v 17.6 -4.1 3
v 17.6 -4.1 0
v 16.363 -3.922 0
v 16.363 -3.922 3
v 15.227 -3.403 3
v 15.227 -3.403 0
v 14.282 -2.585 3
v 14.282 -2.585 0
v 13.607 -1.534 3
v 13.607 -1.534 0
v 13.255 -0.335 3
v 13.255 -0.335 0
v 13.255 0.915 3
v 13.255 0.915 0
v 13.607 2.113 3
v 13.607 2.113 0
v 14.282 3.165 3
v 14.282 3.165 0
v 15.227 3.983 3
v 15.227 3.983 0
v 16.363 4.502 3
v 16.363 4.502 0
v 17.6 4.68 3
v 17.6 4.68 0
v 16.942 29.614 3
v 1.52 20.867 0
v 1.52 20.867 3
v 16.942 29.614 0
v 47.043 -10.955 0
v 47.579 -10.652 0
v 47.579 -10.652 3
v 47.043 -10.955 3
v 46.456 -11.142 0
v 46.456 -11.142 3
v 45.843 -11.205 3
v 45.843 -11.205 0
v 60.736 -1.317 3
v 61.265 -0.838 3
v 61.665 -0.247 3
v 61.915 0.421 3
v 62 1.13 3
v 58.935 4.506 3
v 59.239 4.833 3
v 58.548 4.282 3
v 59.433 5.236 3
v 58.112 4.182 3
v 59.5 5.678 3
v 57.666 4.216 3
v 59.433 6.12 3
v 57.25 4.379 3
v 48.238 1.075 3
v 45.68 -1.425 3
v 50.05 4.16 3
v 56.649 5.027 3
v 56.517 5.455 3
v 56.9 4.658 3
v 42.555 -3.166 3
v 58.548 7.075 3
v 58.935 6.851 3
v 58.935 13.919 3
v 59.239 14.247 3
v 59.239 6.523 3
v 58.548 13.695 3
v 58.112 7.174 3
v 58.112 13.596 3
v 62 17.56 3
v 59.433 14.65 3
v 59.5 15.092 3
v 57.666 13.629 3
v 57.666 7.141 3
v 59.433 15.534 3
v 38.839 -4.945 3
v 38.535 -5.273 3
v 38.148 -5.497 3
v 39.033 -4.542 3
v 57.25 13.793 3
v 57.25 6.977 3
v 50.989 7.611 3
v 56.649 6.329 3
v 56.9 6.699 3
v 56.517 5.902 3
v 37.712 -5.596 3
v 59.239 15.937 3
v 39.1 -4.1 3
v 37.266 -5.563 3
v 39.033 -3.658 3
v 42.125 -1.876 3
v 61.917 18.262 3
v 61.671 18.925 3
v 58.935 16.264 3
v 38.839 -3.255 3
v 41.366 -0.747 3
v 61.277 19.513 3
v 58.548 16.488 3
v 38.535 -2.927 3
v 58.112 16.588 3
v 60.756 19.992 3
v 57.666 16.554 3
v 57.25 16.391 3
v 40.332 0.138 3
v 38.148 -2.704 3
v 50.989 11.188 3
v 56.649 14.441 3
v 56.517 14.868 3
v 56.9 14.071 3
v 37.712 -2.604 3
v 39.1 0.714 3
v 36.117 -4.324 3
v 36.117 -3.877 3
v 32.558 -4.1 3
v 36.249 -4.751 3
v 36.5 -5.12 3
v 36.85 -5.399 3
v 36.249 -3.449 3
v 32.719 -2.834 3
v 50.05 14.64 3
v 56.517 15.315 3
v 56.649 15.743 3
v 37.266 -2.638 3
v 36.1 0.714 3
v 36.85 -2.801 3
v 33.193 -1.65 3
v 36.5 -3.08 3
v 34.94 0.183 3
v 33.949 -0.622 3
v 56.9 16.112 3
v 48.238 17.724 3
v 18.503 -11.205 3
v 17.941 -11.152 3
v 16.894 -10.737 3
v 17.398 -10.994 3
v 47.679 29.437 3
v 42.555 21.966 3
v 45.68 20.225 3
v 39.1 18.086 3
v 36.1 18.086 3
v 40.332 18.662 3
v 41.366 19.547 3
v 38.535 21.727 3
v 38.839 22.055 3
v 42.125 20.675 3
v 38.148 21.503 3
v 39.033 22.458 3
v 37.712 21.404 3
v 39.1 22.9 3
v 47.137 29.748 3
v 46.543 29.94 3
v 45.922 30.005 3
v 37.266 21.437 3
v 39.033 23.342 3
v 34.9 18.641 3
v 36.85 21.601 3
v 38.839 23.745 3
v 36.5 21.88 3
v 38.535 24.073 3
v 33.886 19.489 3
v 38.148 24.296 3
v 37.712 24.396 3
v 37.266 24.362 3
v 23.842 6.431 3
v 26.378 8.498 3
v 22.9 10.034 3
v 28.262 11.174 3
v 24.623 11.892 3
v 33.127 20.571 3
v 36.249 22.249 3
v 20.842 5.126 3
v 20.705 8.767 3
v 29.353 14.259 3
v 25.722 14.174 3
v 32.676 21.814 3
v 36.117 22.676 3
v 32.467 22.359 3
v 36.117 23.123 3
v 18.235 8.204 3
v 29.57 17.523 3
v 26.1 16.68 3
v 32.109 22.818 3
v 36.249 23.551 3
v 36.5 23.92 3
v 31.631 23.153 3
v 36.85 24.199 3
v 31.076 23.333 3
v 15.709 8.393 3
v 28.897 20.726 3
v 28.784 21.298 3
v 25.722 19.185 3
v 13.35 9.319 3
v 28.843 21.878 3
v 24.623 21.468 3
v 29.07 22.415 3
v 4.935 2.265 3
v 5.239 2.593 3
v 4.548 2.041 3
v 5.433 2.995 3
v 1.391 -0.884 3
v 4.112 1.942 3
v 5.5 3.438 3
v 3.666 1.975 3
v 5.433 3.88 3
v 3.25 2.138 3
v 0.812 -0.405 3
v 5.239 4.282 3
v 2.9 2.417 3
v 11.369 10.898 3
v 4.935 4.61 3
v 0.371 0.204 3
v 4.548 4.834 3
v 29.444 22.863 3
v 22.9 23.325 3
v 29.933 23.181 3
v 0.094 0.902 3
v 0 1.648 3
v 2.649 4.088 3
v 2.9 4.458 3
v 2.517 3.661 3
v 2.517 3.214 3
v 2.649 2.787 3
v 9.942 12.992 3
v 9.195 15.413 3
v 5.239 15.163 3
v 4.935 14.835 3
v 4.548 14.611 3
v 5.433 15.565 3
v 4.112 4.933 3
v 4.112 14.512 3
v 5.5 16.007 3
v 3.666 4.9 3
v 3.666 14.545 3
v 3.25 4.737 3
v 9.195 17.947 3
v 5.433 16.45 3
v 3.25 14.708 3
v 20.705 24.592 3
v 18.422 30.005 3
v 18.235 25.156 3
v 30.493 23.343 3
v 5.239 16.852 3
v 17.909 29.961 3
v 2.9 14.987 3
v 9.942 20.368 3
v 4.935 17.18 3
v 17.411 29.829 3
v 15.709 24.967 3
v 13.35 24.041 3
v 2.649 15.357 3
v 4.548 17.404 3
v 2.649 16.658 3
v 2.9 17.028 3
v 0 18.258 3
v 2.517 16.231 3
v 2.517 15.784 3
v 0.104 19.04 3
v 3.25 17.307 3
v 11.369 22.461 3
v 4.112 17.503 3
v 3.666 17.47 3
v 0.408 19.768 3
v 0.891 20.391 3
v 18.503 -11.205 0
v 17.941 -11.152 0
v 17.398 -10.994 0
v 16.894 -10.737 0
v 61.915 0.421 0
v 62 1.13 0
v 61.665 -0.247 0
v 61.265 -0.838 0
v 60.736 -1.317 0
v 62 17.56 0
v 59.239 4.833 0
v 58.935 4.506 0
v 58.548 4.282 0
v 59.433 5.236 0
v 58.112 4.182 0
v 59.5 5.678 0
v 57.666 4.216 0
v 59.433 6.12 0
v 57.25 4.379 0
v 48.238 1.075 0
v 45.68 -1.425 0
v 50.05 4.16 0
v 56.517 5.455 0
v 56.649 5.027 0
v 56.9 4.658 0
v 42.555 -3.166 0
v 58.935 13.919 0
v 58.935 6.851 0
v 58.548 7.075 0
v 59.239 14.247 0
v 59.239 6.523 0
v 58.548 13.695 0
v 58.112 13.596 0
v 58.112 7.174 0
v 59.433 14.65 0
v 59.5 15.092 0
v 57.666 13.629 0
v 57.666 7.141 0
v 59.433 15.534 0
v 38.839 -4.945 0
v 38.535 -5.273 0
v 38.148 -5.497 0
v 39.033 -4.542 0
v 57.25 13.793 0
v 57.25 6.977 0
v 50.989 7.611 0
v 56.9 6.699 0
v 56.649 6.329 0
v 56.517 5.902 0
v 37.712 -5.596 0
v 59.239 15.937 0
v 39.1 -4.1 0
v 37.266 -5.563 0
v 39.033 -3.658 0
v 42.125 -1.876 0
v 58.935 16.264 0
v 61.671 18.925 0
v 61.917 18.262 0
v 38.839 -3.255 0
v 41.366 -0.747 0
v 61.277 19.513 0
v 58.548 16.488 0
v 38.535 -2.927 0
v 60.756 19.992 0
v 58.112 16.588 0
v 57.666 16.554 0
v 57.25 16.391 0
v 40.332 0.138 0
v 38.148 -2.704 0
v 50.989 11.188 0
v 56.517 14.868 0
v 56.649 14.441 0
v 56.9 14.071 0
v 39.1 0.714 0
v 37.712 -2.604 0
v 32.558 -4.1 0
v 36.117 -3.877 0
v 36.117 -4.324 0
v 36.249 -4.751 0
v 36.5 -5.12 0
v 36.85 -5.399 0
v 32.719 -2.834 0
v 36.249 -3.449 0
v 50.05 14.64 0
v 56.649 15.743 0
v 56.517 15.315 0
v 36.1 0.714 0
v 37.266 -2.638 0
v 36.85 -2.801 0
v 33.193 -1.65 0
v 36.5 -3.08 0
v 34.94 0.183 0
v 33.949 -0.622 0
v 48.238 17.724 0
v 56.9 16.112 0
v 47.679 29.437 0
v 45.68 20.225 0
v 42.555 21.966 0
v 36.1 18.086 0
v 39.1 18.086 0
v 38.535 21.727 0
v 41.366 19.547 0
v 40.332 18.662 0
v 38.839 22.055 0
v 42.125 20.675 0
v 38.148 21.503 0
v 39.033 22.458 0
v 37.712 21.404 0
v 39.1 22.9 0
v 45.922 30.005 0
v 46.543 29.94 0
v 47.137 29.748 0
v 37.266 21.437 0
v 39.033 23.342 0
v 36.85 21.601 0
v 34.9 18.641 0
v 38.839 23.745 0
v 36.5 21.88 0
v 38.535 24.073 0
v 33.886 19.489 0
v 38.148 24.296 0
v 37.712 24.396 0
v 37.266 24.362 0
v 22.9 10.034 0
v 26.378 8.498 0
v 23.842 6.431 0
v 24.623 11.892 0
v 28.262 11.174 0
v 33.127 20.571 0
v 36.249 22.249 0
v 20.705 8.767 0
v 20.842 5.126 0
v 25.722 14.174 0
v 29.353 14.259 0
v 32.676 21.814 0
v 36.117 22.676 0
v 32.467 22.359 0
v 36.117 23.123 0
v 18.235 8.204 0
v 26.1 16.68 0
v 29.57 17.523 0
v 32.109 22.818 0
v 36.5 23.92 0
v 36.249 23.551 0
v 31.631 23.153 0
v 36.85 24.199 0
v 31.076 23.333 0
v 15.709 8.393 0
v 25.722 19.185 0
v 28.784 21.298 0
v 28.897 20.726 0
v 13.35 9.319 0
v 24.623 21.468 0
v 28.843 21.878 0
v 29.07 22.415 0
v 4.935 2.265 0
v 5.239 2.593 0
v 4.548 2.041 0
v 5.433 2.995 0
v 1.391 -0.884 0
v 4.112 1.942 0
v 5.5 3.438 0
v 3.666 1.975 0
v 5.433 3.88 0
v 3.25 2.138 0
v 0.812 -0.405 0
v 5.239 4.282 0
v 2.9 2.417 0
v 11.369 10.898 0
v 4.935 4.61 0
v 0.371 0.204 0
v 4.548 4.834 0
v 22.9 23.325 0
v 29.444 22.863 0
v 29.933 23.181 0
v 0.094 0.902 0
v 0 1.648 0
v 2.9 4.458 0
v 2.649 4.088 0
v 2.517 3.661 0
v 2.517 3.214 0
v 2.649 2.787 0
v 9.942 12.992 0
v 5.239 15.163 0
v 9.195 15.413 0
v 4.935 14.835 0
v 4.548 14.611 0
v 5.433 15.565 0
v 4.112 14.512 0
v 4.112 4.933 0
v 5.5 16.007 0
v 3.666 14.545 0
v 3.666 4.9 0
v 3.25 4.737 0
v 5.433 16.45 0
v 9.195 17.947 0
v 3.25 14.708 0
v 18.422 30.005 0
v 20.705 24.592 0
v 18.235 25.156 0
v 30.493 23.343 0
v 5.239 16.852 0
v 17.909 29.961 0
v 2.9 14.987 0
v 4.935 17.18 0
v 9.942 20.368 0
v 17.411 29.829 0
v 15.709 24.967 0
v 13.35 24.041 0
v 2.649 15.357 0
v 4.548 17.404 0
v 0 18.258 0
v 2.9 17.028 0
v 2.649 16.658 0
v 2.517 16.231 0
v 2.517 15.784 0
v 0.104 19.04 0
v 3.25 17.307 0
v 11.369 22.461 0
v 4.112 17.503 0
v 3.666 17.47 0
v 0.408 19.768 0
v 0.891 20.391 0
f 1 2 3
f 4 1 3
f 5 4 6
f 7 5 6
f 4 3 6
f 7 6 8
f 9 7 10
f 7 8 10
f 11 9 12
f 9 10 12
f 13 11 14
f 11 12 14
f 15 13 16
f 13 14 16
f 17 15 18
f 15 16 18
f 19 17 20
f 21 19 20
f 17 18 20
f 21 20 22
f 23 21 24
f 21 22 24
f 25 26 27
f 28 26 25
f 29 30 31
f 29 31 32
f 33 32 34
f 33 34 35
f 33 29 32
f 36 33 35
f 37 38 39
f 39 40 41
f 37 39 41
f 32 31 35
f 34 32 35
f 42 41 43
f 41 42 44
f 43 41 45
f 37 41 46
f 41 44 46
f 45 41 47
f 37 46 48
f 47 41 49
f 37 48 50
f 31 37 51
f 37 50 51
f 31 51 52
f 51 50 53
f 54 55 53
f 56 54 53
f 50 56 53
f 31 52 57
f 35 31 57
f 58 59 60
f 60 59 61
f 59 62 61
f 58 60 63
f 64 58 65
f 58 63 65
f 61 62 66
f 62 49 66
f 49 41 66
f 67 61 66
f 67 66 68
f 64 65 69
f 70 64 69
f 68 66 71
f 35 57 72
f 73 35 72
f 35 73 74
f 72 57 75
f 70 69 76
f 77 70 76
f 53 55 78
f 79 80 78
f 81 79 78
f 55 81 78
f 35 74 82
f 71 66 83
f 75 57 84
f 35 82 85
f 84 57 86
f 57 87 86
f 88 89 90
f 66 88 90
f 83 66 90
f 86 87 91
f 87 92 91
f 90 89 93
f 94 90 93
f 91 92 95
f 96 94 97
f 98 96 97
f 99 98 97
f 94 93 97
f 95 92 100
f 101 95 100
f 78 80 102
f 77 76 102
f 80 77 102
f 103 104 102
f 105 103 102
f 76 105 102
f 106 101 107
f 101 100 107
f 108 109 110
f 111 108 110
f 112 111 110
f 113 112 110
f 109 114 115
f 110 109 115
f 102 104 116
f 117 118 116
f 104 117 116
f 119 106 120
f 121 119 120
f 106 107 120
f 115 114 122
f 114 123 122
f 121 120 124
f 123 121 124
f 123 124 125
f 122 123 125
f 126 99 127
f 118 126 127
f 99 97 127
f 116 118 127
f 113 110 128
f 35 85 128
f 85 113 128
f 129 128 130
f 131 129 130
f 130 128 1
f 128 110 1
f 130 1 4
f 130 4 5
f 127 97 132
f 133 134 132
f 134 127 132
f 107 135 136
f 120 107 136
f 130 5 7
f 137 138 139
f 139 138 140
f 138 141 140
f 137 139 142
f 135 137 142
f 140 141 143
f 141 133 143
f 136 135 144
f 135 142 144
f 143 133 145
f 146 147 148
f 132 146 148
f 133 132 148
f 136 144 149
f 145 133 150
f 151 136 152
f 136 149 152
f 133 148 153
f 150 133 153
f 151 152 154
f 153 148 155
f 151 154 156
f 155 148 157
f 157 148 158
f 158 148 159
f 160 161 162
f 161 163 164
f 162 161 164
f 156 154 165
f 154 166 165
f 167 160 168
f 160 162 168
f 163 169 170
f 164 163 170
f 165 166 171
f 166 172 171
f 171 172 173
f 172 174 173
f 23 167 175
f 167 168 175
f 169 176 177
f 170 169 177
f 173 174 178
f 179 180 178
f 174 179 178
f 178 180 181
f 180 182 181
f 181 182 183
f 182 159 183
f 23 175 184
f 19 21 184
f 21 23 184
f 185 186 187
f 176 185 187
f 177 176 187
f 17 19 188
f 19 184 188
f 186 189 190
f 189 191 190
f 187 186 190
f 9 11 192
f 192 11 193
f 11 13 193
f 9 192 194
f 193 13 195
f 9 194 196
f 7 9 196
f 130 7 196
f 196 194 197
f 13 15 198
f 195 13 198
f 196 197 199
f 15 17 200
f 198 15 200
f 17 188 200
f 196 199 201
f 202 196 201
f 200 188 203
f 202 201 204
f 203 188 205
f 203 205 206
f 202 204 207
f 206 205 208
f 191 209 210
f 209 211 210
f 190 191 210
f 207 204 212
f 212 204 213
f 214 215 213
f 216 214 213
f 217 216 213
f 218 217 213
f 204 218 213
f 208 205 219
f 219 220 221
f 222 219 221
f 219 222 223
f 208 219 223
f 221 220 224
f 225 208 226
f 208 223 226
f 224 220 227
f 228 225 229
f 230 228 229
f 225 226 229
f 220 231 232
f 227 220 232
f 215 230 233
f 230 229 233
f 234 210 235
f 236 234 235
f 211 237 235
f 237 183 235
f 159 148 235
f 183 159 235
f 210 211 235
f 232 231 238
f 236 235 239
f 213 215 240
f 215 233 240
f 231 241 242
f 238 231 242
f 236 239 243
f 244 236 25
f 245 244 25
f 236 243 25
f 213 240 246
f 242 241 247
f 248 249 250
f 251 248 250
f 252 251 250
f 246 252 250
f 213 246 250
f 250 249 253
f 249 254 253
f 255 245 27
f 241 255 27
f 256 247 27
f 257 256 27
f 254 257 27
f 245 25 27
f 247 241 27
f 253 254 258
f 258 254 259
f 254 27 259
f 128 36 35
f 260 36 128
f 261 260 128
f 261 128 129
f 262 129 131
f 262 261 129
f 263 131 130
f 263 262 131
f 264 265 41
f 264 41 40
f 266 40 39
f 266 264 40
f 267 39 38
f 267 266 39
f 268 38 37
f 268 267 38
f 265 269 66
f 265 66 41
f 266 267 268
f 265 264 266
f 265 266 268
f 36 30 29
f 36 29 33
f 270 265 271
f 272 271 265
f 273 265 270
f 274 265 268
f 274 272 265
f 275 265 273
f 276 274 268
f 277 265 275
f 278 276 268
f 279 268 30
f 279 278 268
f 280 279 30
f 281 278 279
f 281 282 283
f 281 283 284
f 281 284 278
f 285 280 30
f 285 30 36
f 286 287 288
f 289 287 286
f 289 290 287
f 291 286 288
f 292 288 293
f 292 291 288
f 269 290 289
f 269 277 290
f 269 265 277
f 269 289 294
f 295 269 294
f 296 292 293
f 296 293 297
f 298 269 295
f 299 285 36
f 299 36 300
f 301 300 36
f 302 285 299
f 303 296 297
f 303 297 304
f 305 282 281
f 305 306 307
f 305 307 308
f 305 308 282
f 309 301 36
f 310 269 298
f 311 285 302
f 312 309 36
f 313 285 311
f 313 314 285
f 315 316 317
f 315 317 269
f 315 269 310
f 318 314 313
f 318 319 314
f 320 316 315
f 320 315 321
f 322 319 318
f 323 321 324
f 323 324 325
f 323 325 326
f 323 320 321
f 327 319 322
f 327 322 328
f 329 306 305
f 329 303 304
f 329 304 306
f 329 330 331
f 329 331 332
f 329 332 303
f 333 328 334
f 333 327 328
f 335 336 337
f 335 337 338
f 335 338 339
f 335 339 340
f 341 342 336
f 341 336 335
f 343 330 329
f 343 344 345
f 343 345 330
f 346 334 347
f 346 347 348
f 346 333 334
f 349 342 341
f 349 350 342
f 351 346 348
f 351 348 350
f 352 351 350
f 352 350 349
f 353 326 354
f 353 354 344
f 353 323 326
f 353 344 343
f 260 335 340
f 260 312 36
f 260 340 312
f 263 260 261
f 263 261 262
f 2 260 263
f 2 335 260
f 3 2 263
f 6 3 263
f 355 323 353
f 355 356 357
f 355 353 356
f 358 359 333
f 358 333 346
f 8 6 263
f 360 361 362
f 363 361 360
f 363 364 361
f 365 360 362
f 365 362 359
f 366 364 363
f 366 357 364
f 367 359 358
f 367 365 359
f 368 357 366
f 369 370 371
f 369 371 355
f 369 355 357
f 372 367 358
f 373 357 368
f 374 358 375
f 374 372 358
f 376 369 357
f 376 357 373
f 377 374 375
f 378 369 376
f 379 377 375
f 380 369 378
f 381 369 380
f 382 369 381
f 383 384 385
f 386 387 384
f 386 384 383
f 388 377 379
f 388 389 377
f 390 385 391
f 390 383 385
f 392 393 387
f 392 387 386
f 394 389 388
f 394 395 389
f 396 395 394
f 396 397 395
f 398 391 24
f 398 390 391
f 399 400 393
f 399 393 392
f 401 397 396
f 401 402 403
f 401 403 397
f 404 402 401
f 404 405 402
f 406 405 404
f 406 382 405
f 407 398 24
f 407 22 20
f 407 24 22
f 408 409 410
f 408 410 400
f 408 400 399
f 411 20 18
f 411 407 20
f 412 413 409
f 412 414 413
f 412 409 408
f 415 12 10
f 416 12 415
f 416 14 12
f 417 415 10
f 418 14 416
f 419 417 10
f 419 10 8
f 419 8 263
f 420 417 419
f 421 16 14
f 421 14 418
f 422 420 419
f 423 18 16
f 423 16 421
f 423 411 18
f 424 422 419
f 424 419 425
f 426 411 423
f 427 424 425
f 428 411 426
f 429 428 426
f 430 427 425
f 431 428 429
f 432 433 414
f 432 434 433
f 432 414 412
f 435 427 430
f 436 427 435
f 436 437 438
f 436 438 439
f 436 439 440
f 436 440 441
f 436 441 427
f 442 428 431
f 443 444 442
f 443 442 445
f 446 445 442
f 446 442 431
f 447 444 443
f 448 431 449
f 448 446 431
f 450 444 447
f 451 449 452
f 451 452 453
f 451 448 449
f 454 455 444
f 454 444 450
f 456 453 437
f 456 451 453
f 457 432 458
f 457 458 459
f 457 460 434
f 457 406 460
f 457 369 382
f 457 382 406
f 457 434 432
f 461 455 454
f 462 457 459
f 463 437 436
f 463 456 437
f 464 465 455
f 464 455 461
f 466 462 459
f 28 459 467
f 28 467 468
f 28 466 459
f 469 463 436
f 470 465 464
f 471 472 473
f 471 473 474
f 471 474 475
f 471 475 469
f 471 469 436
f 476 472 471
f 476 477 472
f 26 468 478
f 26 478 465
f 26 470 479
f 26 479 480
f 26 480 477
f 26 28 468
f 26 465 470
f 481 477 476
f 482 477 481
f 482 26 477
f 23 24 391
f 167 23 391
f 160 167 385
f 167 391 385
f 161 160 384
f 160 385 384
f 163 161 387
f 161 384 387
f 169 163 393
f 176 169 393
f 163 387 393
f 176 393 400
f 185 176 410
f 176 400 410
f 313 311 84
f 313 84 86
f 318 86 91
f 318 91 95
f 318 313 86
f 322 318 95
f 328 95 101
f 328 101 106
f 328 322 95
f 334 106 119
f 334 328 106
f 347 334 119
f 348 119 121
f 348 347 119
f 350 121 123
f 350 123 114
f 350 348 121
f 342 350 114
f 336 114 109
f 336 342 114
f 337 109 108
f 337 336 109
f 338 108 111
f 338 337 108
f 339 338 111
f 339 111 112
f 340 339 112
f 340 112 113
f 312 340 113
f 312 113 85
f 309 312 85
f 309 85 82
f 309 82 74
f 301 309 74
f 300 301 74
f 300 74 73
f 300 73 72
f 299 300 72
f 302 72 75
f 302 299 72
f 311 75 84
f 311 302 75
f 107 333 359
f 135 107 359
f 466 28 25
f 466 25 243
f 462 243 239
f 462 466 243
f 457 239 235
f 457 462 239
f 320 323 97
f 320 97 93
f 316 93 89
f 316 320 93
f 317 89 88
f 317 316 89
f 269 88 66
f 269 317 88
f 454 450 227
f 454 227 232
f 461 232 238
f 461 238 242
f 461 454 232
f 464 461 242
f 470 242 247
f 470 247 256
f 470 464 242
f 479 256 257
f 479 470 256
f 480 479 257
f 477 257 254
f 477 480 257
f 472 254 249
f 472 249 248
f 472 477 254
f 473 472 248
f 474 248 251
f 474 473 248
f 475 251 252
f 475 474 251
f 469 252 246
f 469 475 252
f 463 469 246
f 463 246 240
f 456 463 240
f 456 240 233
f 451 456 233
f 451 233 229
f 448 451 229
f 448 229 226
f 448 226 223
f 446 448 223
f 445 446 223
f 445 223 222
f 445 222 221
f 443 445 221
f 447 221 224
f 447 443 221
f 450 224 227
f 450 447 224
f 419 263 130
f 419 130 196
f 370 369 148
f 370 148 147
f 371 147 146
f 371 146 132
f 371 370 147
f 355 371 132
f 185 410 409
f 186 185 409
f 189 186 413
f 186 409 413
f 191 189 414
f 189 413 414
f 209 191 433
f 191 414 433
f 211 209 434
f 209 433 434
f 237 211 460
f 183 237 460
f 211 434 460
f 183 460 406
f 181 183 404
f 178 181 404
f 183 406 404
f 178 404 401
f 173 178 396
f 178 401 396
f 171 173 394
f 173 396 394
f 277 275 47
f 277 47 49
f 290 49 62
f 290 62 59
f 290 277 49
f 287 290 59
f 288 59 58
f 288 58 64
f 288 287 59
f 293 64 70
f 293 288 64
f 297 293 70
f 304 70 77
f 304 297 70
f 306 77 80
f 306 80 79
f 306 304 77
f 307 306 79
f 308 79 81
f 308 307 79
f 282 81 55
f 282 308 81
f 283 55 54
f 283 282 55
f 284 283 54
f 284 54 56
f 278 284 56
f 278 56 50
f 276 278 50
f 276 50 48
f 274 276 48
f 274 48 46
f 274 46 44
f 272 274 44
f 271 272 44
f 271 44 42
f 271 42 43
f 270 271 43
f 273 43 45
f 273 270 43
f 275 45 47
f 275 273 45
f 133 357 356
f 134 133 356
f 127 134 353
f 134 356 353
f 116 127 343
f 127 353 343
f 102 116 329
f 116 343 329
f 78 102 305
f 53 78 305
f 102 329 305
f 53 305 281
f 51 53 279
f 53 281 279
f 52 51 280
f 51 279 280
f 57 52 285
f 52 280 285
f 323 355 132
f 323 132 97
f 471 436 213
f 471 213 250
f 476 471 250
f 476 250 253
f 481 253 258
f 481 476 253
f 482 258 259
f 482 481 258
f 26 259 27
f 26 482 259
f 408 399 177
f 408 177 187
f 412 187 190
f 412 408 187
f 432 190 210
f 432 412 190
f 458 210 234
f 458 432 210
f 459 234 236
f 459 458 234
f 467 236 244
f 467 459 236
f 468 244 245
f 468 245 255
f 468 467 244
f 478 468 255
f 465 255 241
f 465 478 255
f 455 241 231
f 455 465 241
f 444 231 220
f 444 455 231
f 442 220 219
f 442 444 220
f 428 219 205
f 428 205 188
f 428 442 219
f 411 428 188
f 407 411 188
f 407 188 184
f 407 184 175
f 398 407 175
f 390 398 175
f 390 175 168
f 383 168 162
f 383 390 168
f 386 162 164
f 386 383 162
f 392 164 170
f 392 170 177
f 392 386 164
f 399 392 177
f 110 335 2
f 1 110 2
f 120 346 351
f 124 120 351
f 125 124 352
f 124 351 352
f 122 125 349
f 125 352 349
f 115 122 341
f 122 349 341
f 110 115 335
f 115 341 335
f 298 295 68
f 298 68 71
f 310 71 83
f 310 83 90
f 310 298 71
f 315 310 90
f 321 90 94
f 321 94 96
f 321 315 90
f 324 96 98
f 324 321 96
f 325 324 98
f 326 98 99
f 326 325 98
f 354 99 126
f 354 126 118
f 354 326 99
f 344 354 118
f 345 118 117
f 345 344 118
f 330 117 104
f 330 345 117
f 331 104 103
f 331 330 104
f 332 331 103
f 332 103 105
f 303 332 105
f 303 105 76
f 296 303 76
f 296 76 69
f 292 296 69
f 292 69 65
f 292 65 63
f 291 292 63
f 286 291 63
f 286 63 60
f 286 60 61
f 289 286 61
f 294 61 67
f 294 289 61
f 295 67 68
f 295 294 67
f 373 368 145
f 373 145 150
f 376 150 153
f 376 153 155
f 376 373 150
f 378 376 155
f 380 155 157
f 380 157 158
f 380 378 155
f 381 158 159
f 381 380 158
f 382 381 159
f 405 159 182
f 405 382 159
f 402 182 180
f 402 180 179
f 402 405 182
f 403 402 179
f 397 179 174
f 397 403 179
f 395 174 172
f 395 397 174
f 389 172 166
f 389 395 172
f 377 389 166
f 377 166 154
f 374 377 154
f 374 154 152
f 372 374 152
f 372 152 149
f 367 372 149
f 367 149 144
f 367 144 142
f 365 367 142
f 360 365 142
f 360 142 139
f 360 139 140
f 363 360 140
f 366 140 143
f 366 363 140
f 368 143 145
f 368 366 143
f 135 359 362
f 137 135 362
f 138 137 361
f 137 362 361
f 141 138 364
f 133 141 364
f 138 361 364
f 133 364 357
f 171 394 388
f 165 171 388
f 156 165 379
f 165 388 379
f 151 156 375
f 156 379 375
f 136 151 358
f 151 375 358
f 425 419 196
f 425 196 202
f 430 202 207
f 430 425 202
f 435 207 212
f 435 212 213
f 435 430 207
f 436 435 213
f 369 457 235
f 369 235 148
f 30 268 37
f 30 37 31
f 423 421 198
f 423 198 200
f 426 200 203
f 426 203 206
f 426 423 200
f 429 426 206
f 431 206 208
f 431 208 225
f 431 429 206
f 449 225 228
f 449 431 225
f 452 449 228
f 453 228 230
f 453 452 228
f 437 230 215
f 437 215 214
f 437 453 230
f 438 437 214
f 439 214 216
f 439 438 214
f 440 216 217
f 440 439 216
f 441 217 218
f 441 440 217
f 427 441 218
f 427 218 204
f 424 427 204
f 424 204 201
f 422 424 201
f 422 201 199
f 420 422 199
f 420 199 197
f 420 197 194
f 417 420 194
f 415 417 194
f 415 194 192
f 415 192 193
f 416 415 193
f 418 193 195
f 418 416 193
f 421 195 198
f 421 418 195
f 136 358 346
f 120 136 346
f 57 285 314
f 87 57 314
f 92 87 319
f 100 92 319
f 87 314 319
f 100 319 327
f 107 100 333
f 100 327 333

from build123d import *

# Parameters (mm, degrees)
SKETCH1_R           = 1.5
SKETCH1_R_2         = 8.5
BOSS_EXTRUDE1_DEPTH = 3


with BuildPart() as part:
    # Sketch1 → Boss-Extrude1 (new body)
    with BuildSketch(Plane.XY):
        with BuildLine():
            Line((0, 1.64796966), (0, 18.25796966))
            ThreePointArc((0, 18.25796966), (0.407702513, 19.767934474), (1.519995827, 20.867488322))
            Line((1.519995827, 20.867488322), (16.942251121, 29.614312984))
            ThreePointArc((16.942251121, 29.614312984), (17.656930521, 29.905531813), (18.422255294, 30.004794322))
            Line((18.422255294, 30.004794322), (45.922255294, 30.004794322))
            ThreePointArc((45.922255294, 30.004794322), (46.845265991, 29.859273478), (47.678731824, 29.43682849))
            Line((47.678731824, 29.43682849), (60.756476531, 19.991750808))
            ThreePointArc((60.756476531, 19.991750808), (61.671088691, 18.925471084), (62, 17.559716639))
            Line((62, 17.559716639), (62, 1.129716639))
            ThreePointArc((62, 1.129716639), (61.66533053, -0.247241299), (60.735991224, -1.316982049))
            Line((60.735991224, -1.316982049), (47.579391193, -10.651904367))
            ThreePointArc((47.579391193, -10.651904367), (46.754416966, -11.063535266), (45.84339997, -11.205205678))
            Line((45.84339997, -11.205205678), (18.50339997, -11.205205678))
            ThreePointArc((18.50339997, -11.205205678), (17.66547208, -11.085809235), (16.894241264, -10.73712358))
            Line((16.894241264, -10.73712358), (1.390841294, -0.883948242))
            ThreePointArc((1.390841294, -0.883948242), (0.370601198, 0.203579844), (0, 1.64796966))
        make_face()
        with Locations((4, 16.007488322)):
            Circle(SKETCH1_R, mode=Mode.SUBTRACT)
        with Locations((4, 3.4375)):
            Circle(SKETCH1_R, mode=Mode.SUBTRACT)
        with Locations((58, 15.091750808)):
            Circle(SKETCH1_R, mode=Mode.SUBTRACT)
        with Locations((58, 5.678289269)):
            Circle(SKETCH1_R, mode=Mode.SUBTRACT)
        with Locations((37.6, 22.899794322)):
            Circle(SKETCH1_R, mode=Mode.SUBTRACT)
        with Locations((37.6, -4.100205678)):
            Circle(SKETCH1_R, mode=Mode.SUBTRACT)
        with Locations((17.6, 16.679794322)):
            Circle(SKETCH1_R_2, mode=Mode.SUBTRACT)
        with BuildLine():
            Line((39.1, 0.713961497), (39.1, 18.085627146))
            ThreePointArc((39.1, 18.085627146), (41.365876, 19.546529711), (42.555224583, 21.966009055))
            ThreePointArc((42.555224583, 21.966009055), (51.107923726, 9.399794322), (42.555224583, -3.166420412))
            ThreePointArc((42.555224583, -3.166420412), (41.365876, -0.746941068), (39.1, 0.713961497))
        make_face(mode=Mode.SUBTRACT)
        with BuildLine():
            Line((36.1, 18.085627146), (36.1, 0.713961497))
            ThreePointArc((36.1, 0.713961497), (33.538604534, -1.111682219), (32.55755956, -4.100205678))
            Line((32.55755956, -4.100205678), (17.6, -4.100205678))
            ThreePointArc((17.6, -4.100205678), (13.21, 0.289794322), (17.6, 4.679794322))
            ThreePointArc((17.6, 4.679794322), (27.411976087, 9.771456948), (28.897406852, 20.725606777))
            ThreePointArc((28.897406852, 20.725606777), (30.206772534, 23.282822768), (32.675850225, 21.813997568))
            ThreePointArc((32.675850225, 21.813997568), (33.886159456, 19.488988843), (36.1, 18.085627146))
        make_face(mode=Mode.SUBTRACT)
    extrude(amount=BOSS_EXTRUDE1_DEPTH)


solid = part.part
